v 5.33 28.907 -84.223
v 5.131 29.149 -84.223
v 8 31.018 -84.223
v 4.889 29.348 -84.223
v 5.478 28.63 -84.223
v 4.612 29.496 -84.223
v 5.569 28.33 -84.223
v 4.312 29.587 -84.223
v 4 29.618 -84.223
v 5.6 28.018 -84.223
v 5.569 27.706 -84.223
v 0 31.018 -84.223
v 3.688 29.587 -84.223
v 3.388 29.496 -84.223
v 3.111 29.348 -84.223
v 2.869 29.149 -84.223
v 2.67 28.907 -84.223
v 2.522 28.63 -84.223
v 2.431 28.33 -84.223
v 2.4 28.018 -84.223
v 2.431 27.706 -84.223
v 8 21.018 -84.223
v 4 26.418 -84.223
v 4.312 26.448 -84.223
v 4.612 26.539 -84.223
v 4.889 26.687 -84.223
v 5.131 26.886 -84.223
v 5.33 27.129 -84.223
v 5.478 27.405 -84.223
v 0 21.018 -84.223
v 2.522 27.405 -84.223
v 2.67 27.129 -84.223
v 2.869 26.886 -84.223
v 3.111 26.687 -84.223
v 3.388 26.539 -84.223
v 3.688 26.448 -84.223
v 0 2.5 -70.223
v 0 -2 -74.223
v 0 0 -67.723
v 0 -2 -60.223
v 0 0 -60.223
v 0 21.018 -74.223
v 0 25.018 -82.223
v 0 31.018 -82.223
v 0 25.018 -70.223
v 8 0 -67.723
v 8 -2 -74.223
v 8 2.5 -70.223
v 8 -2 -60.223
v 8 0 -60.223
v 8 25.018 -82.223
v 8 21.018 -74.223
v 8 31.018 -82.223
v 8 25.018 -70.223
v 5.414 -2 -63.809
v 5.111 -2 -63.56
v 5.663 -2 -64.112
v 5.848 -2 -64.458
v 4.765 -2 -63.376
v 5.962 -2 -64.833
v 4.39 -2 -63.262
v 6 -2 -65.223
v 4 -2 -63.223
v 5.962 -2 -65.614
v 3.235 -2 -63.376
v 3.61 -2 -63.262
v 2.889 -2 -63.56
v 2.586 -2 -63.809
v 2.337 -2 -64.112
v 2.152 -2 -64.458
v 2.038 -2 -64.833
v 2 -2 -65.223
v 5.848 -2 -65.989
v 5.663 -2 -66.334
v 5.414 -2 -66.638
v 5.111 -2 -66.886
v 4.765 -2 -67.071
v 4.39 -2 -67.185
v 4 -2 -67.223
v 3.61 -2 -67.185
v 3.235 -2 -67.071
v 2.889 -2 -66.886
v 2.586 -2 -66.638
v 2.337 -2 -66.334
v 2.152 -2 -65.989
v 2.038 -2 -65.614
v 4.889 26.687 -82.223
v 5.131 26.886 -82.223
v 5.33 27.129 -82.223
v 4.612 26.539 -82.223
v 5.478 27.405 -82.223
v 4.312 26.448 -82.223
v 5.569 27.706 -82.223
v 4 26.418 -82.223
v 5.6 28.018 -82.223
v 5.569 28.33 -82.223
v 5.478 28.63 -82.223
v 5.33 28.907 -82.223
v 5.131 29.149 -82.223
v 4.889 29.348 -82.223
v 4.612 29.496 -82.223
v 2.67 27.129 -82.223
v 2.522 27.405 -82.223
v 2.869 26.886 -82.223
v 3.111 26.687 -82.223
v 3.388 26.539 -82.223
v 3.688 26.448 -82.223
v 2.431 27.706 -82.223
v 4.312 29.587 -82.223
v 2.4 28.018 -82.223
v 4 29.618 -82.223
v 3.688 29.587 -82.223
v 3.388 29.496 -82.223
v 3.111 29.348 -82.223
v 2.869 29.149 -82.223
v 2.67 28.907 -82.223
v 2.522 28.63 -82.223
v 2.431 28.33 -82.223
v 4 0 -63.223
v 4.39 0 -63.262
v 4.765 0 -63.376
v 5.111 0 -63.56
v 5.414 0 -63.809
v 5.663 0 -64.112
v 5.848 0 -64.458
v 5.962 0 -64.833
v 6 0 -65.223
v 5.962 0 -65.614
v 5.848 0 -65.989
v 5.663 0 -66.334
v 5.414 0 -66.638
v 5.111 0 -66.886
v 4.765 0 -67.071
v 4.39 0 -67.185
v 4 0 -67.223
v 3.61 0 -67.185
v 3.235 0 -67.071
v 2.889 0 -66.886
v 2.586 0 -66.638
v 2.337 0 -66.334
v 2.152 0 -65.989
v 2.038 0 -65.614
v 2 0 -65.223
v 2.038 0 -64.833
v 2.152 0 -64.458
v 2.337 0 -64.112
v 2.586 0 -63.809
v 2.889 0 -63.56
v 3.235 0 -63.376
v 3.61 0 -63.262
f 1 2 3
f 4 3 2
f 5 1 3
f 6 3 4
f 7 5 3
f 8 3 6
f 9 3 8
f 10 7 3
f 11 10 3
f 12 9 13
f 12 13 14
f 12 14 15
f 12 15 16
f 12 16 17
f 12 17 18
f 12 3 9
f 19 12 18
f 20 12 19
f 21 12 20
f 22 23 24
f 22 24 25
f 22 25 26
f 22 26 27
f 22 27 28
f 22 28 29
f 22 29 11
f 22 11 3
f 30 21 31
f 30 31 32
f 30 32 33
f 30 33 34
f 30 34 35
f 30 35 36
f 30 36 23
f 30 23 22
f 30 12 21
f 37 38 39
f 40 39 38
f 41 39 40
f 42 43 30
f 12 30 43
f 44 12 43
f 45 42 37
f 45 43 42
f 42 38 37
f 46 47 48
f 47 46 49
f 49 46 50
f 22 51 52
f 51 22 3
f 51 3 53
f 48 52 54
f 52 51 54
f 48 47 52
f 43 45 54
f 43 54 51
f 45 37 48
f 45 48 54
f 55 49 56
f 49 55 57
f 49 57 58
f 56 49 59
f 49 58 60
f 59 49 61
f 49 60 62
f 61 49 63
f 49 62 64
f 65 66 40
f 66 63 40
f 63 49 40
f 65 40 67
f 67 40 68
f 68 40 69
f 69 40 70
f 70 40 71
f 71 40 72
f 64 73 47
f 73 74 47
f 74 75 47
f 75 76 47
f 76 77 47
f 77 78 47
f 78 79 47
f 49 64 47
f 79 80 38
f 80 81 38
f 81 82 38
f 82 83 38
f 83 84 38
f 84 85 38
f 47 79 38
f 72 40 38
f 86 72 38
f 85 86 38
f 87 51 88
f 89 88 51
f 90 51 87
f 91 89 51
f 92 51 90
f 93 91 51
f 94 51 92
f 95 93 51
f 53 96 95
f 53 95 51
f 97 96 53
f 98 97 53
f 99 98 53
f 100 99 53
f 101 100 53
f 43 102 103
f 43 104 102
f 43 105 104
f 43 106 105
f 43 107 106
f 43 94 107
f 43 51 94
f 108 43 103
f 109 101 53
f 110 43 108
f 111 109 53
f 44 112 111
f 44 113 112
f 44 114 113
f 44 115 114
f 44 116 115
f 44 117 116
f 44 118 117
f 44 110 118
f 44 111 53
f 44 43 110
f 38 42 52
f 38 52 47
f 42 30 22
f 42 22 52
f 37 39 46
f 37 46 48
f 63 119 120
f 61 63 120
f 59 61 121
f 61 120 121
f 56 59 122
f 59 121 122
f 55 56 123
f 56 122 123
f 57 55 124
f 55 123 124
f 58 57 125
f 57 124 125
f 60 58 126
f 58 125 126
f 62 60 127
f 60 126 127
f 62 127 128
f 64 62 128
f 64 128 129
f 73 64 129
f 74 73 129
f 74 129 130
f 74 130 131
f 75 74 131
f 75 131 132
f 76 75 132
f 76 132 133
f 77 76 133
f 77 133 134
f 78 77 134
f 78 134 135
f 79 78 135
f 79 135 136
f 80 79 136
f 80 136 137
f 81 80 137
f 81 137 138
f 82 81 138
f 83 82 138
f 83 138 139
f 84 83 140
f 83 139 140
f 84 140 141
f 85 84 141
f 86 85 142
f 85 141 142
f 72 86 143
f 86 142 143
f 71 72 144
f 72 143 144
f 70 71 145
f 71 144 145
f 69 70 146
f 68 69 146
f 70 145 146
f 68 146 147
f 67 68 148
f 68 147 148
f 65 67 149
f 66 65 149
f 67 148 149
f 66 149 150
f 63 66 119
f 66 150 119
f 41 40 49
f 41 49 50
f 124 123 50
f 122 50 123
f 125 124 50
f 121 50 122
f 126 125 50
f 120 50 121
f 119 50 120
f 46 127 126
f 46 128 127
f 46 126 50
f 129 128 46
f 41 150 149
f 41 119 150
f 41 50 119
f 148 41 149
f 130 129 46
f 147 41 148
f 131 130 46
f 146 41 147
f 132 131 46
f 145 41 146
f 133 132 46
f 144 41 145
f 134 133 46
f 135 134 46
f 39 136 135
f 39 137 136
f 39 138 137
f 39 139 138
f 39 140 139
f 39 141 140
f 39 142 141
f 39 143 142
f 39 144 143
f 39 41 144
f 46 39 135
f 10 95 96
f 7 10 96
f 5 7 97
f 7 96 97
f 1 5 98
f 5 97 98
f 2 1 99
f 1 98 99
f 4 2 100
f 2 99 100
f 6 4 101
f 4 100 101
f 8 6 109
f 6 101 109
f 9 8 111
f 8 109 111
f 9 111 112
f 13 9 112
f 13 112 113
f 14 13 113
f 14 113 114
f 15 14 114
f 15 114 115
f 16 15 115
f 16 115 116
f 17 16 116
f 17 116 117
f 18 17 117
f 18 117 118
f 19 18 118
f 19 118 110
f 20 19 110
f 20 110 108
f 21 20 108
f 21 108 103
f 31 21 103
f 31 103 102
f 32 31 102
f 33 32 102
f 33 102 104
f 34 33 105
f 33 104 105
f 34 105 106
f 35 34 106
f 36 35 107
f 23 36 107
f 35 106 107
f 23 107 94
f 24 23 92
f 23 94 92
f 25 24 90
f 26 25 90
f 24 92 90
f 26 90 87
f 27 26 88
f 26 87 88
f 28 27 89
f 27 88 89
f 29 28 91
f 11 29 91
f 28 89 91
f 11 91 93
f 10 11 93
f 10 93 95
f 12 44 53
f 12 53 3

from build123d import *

# Parameters (mm, degrees)
BOSS_EXTRUDE1_DEPTH = 8
SKETCH3_R           = 1.6
CUT_EXTRUDE1_DEPTH  = 10
SKETCH4_R           = 2
CUT_EXTRUDE2_DEPTH  = 10


with BuildPart() as part:
    # Sketch1 → Boss-Extrude1 (new body)
    with BuildSketch(Plane(origin=(0, 0, 0), x_dir=(0, 0, -1), z_dir=(1, 0, 0))):
        Polygon((70.223325062, 25.017667028), (82.223325062, 25.017667028), (82.223325062, 31.017667028), (84.223325062, 31.017667028), (84.223325062, 21.017667028), (74.223325062, 21.017667028), (74.223325062, -2), (70.223325062, -2), (60.223325062, -2), (60.223325062, 0), (67.723325062, 0), (70.223325062, 2.5), align=None)
    extrude(amount=BOSS_EXTRUDE1_DEPTH)

    # Sketch3 → Cut-Extrude1 (cut)
    with BuildSketch(Plane.XY.offset(-82.223325062)):
        with Locations((4, 28.017667028)):
            Circle(SKETCH3_R)
    extrude(amount=-CUT_EXTRUDE1_DEPTH, mode=Mode.SUBTRACT)

    # Sketch4 → Cut-Extrude2 (cut)
    with BuildSketch(Plane(origin=(0, 0, 0), x_dir=(1, 0, 0), z_dir=(0, 1, 0))):
        with Locations(Location((4, 65.223325062, 0), (0, 0, 270))):
            Circle(SKETCH4_R)
    extrude(amount=-CUT_EXTRUDE2_DEPTH, mode=Mode.SUBTRACT)


solid = part.part
